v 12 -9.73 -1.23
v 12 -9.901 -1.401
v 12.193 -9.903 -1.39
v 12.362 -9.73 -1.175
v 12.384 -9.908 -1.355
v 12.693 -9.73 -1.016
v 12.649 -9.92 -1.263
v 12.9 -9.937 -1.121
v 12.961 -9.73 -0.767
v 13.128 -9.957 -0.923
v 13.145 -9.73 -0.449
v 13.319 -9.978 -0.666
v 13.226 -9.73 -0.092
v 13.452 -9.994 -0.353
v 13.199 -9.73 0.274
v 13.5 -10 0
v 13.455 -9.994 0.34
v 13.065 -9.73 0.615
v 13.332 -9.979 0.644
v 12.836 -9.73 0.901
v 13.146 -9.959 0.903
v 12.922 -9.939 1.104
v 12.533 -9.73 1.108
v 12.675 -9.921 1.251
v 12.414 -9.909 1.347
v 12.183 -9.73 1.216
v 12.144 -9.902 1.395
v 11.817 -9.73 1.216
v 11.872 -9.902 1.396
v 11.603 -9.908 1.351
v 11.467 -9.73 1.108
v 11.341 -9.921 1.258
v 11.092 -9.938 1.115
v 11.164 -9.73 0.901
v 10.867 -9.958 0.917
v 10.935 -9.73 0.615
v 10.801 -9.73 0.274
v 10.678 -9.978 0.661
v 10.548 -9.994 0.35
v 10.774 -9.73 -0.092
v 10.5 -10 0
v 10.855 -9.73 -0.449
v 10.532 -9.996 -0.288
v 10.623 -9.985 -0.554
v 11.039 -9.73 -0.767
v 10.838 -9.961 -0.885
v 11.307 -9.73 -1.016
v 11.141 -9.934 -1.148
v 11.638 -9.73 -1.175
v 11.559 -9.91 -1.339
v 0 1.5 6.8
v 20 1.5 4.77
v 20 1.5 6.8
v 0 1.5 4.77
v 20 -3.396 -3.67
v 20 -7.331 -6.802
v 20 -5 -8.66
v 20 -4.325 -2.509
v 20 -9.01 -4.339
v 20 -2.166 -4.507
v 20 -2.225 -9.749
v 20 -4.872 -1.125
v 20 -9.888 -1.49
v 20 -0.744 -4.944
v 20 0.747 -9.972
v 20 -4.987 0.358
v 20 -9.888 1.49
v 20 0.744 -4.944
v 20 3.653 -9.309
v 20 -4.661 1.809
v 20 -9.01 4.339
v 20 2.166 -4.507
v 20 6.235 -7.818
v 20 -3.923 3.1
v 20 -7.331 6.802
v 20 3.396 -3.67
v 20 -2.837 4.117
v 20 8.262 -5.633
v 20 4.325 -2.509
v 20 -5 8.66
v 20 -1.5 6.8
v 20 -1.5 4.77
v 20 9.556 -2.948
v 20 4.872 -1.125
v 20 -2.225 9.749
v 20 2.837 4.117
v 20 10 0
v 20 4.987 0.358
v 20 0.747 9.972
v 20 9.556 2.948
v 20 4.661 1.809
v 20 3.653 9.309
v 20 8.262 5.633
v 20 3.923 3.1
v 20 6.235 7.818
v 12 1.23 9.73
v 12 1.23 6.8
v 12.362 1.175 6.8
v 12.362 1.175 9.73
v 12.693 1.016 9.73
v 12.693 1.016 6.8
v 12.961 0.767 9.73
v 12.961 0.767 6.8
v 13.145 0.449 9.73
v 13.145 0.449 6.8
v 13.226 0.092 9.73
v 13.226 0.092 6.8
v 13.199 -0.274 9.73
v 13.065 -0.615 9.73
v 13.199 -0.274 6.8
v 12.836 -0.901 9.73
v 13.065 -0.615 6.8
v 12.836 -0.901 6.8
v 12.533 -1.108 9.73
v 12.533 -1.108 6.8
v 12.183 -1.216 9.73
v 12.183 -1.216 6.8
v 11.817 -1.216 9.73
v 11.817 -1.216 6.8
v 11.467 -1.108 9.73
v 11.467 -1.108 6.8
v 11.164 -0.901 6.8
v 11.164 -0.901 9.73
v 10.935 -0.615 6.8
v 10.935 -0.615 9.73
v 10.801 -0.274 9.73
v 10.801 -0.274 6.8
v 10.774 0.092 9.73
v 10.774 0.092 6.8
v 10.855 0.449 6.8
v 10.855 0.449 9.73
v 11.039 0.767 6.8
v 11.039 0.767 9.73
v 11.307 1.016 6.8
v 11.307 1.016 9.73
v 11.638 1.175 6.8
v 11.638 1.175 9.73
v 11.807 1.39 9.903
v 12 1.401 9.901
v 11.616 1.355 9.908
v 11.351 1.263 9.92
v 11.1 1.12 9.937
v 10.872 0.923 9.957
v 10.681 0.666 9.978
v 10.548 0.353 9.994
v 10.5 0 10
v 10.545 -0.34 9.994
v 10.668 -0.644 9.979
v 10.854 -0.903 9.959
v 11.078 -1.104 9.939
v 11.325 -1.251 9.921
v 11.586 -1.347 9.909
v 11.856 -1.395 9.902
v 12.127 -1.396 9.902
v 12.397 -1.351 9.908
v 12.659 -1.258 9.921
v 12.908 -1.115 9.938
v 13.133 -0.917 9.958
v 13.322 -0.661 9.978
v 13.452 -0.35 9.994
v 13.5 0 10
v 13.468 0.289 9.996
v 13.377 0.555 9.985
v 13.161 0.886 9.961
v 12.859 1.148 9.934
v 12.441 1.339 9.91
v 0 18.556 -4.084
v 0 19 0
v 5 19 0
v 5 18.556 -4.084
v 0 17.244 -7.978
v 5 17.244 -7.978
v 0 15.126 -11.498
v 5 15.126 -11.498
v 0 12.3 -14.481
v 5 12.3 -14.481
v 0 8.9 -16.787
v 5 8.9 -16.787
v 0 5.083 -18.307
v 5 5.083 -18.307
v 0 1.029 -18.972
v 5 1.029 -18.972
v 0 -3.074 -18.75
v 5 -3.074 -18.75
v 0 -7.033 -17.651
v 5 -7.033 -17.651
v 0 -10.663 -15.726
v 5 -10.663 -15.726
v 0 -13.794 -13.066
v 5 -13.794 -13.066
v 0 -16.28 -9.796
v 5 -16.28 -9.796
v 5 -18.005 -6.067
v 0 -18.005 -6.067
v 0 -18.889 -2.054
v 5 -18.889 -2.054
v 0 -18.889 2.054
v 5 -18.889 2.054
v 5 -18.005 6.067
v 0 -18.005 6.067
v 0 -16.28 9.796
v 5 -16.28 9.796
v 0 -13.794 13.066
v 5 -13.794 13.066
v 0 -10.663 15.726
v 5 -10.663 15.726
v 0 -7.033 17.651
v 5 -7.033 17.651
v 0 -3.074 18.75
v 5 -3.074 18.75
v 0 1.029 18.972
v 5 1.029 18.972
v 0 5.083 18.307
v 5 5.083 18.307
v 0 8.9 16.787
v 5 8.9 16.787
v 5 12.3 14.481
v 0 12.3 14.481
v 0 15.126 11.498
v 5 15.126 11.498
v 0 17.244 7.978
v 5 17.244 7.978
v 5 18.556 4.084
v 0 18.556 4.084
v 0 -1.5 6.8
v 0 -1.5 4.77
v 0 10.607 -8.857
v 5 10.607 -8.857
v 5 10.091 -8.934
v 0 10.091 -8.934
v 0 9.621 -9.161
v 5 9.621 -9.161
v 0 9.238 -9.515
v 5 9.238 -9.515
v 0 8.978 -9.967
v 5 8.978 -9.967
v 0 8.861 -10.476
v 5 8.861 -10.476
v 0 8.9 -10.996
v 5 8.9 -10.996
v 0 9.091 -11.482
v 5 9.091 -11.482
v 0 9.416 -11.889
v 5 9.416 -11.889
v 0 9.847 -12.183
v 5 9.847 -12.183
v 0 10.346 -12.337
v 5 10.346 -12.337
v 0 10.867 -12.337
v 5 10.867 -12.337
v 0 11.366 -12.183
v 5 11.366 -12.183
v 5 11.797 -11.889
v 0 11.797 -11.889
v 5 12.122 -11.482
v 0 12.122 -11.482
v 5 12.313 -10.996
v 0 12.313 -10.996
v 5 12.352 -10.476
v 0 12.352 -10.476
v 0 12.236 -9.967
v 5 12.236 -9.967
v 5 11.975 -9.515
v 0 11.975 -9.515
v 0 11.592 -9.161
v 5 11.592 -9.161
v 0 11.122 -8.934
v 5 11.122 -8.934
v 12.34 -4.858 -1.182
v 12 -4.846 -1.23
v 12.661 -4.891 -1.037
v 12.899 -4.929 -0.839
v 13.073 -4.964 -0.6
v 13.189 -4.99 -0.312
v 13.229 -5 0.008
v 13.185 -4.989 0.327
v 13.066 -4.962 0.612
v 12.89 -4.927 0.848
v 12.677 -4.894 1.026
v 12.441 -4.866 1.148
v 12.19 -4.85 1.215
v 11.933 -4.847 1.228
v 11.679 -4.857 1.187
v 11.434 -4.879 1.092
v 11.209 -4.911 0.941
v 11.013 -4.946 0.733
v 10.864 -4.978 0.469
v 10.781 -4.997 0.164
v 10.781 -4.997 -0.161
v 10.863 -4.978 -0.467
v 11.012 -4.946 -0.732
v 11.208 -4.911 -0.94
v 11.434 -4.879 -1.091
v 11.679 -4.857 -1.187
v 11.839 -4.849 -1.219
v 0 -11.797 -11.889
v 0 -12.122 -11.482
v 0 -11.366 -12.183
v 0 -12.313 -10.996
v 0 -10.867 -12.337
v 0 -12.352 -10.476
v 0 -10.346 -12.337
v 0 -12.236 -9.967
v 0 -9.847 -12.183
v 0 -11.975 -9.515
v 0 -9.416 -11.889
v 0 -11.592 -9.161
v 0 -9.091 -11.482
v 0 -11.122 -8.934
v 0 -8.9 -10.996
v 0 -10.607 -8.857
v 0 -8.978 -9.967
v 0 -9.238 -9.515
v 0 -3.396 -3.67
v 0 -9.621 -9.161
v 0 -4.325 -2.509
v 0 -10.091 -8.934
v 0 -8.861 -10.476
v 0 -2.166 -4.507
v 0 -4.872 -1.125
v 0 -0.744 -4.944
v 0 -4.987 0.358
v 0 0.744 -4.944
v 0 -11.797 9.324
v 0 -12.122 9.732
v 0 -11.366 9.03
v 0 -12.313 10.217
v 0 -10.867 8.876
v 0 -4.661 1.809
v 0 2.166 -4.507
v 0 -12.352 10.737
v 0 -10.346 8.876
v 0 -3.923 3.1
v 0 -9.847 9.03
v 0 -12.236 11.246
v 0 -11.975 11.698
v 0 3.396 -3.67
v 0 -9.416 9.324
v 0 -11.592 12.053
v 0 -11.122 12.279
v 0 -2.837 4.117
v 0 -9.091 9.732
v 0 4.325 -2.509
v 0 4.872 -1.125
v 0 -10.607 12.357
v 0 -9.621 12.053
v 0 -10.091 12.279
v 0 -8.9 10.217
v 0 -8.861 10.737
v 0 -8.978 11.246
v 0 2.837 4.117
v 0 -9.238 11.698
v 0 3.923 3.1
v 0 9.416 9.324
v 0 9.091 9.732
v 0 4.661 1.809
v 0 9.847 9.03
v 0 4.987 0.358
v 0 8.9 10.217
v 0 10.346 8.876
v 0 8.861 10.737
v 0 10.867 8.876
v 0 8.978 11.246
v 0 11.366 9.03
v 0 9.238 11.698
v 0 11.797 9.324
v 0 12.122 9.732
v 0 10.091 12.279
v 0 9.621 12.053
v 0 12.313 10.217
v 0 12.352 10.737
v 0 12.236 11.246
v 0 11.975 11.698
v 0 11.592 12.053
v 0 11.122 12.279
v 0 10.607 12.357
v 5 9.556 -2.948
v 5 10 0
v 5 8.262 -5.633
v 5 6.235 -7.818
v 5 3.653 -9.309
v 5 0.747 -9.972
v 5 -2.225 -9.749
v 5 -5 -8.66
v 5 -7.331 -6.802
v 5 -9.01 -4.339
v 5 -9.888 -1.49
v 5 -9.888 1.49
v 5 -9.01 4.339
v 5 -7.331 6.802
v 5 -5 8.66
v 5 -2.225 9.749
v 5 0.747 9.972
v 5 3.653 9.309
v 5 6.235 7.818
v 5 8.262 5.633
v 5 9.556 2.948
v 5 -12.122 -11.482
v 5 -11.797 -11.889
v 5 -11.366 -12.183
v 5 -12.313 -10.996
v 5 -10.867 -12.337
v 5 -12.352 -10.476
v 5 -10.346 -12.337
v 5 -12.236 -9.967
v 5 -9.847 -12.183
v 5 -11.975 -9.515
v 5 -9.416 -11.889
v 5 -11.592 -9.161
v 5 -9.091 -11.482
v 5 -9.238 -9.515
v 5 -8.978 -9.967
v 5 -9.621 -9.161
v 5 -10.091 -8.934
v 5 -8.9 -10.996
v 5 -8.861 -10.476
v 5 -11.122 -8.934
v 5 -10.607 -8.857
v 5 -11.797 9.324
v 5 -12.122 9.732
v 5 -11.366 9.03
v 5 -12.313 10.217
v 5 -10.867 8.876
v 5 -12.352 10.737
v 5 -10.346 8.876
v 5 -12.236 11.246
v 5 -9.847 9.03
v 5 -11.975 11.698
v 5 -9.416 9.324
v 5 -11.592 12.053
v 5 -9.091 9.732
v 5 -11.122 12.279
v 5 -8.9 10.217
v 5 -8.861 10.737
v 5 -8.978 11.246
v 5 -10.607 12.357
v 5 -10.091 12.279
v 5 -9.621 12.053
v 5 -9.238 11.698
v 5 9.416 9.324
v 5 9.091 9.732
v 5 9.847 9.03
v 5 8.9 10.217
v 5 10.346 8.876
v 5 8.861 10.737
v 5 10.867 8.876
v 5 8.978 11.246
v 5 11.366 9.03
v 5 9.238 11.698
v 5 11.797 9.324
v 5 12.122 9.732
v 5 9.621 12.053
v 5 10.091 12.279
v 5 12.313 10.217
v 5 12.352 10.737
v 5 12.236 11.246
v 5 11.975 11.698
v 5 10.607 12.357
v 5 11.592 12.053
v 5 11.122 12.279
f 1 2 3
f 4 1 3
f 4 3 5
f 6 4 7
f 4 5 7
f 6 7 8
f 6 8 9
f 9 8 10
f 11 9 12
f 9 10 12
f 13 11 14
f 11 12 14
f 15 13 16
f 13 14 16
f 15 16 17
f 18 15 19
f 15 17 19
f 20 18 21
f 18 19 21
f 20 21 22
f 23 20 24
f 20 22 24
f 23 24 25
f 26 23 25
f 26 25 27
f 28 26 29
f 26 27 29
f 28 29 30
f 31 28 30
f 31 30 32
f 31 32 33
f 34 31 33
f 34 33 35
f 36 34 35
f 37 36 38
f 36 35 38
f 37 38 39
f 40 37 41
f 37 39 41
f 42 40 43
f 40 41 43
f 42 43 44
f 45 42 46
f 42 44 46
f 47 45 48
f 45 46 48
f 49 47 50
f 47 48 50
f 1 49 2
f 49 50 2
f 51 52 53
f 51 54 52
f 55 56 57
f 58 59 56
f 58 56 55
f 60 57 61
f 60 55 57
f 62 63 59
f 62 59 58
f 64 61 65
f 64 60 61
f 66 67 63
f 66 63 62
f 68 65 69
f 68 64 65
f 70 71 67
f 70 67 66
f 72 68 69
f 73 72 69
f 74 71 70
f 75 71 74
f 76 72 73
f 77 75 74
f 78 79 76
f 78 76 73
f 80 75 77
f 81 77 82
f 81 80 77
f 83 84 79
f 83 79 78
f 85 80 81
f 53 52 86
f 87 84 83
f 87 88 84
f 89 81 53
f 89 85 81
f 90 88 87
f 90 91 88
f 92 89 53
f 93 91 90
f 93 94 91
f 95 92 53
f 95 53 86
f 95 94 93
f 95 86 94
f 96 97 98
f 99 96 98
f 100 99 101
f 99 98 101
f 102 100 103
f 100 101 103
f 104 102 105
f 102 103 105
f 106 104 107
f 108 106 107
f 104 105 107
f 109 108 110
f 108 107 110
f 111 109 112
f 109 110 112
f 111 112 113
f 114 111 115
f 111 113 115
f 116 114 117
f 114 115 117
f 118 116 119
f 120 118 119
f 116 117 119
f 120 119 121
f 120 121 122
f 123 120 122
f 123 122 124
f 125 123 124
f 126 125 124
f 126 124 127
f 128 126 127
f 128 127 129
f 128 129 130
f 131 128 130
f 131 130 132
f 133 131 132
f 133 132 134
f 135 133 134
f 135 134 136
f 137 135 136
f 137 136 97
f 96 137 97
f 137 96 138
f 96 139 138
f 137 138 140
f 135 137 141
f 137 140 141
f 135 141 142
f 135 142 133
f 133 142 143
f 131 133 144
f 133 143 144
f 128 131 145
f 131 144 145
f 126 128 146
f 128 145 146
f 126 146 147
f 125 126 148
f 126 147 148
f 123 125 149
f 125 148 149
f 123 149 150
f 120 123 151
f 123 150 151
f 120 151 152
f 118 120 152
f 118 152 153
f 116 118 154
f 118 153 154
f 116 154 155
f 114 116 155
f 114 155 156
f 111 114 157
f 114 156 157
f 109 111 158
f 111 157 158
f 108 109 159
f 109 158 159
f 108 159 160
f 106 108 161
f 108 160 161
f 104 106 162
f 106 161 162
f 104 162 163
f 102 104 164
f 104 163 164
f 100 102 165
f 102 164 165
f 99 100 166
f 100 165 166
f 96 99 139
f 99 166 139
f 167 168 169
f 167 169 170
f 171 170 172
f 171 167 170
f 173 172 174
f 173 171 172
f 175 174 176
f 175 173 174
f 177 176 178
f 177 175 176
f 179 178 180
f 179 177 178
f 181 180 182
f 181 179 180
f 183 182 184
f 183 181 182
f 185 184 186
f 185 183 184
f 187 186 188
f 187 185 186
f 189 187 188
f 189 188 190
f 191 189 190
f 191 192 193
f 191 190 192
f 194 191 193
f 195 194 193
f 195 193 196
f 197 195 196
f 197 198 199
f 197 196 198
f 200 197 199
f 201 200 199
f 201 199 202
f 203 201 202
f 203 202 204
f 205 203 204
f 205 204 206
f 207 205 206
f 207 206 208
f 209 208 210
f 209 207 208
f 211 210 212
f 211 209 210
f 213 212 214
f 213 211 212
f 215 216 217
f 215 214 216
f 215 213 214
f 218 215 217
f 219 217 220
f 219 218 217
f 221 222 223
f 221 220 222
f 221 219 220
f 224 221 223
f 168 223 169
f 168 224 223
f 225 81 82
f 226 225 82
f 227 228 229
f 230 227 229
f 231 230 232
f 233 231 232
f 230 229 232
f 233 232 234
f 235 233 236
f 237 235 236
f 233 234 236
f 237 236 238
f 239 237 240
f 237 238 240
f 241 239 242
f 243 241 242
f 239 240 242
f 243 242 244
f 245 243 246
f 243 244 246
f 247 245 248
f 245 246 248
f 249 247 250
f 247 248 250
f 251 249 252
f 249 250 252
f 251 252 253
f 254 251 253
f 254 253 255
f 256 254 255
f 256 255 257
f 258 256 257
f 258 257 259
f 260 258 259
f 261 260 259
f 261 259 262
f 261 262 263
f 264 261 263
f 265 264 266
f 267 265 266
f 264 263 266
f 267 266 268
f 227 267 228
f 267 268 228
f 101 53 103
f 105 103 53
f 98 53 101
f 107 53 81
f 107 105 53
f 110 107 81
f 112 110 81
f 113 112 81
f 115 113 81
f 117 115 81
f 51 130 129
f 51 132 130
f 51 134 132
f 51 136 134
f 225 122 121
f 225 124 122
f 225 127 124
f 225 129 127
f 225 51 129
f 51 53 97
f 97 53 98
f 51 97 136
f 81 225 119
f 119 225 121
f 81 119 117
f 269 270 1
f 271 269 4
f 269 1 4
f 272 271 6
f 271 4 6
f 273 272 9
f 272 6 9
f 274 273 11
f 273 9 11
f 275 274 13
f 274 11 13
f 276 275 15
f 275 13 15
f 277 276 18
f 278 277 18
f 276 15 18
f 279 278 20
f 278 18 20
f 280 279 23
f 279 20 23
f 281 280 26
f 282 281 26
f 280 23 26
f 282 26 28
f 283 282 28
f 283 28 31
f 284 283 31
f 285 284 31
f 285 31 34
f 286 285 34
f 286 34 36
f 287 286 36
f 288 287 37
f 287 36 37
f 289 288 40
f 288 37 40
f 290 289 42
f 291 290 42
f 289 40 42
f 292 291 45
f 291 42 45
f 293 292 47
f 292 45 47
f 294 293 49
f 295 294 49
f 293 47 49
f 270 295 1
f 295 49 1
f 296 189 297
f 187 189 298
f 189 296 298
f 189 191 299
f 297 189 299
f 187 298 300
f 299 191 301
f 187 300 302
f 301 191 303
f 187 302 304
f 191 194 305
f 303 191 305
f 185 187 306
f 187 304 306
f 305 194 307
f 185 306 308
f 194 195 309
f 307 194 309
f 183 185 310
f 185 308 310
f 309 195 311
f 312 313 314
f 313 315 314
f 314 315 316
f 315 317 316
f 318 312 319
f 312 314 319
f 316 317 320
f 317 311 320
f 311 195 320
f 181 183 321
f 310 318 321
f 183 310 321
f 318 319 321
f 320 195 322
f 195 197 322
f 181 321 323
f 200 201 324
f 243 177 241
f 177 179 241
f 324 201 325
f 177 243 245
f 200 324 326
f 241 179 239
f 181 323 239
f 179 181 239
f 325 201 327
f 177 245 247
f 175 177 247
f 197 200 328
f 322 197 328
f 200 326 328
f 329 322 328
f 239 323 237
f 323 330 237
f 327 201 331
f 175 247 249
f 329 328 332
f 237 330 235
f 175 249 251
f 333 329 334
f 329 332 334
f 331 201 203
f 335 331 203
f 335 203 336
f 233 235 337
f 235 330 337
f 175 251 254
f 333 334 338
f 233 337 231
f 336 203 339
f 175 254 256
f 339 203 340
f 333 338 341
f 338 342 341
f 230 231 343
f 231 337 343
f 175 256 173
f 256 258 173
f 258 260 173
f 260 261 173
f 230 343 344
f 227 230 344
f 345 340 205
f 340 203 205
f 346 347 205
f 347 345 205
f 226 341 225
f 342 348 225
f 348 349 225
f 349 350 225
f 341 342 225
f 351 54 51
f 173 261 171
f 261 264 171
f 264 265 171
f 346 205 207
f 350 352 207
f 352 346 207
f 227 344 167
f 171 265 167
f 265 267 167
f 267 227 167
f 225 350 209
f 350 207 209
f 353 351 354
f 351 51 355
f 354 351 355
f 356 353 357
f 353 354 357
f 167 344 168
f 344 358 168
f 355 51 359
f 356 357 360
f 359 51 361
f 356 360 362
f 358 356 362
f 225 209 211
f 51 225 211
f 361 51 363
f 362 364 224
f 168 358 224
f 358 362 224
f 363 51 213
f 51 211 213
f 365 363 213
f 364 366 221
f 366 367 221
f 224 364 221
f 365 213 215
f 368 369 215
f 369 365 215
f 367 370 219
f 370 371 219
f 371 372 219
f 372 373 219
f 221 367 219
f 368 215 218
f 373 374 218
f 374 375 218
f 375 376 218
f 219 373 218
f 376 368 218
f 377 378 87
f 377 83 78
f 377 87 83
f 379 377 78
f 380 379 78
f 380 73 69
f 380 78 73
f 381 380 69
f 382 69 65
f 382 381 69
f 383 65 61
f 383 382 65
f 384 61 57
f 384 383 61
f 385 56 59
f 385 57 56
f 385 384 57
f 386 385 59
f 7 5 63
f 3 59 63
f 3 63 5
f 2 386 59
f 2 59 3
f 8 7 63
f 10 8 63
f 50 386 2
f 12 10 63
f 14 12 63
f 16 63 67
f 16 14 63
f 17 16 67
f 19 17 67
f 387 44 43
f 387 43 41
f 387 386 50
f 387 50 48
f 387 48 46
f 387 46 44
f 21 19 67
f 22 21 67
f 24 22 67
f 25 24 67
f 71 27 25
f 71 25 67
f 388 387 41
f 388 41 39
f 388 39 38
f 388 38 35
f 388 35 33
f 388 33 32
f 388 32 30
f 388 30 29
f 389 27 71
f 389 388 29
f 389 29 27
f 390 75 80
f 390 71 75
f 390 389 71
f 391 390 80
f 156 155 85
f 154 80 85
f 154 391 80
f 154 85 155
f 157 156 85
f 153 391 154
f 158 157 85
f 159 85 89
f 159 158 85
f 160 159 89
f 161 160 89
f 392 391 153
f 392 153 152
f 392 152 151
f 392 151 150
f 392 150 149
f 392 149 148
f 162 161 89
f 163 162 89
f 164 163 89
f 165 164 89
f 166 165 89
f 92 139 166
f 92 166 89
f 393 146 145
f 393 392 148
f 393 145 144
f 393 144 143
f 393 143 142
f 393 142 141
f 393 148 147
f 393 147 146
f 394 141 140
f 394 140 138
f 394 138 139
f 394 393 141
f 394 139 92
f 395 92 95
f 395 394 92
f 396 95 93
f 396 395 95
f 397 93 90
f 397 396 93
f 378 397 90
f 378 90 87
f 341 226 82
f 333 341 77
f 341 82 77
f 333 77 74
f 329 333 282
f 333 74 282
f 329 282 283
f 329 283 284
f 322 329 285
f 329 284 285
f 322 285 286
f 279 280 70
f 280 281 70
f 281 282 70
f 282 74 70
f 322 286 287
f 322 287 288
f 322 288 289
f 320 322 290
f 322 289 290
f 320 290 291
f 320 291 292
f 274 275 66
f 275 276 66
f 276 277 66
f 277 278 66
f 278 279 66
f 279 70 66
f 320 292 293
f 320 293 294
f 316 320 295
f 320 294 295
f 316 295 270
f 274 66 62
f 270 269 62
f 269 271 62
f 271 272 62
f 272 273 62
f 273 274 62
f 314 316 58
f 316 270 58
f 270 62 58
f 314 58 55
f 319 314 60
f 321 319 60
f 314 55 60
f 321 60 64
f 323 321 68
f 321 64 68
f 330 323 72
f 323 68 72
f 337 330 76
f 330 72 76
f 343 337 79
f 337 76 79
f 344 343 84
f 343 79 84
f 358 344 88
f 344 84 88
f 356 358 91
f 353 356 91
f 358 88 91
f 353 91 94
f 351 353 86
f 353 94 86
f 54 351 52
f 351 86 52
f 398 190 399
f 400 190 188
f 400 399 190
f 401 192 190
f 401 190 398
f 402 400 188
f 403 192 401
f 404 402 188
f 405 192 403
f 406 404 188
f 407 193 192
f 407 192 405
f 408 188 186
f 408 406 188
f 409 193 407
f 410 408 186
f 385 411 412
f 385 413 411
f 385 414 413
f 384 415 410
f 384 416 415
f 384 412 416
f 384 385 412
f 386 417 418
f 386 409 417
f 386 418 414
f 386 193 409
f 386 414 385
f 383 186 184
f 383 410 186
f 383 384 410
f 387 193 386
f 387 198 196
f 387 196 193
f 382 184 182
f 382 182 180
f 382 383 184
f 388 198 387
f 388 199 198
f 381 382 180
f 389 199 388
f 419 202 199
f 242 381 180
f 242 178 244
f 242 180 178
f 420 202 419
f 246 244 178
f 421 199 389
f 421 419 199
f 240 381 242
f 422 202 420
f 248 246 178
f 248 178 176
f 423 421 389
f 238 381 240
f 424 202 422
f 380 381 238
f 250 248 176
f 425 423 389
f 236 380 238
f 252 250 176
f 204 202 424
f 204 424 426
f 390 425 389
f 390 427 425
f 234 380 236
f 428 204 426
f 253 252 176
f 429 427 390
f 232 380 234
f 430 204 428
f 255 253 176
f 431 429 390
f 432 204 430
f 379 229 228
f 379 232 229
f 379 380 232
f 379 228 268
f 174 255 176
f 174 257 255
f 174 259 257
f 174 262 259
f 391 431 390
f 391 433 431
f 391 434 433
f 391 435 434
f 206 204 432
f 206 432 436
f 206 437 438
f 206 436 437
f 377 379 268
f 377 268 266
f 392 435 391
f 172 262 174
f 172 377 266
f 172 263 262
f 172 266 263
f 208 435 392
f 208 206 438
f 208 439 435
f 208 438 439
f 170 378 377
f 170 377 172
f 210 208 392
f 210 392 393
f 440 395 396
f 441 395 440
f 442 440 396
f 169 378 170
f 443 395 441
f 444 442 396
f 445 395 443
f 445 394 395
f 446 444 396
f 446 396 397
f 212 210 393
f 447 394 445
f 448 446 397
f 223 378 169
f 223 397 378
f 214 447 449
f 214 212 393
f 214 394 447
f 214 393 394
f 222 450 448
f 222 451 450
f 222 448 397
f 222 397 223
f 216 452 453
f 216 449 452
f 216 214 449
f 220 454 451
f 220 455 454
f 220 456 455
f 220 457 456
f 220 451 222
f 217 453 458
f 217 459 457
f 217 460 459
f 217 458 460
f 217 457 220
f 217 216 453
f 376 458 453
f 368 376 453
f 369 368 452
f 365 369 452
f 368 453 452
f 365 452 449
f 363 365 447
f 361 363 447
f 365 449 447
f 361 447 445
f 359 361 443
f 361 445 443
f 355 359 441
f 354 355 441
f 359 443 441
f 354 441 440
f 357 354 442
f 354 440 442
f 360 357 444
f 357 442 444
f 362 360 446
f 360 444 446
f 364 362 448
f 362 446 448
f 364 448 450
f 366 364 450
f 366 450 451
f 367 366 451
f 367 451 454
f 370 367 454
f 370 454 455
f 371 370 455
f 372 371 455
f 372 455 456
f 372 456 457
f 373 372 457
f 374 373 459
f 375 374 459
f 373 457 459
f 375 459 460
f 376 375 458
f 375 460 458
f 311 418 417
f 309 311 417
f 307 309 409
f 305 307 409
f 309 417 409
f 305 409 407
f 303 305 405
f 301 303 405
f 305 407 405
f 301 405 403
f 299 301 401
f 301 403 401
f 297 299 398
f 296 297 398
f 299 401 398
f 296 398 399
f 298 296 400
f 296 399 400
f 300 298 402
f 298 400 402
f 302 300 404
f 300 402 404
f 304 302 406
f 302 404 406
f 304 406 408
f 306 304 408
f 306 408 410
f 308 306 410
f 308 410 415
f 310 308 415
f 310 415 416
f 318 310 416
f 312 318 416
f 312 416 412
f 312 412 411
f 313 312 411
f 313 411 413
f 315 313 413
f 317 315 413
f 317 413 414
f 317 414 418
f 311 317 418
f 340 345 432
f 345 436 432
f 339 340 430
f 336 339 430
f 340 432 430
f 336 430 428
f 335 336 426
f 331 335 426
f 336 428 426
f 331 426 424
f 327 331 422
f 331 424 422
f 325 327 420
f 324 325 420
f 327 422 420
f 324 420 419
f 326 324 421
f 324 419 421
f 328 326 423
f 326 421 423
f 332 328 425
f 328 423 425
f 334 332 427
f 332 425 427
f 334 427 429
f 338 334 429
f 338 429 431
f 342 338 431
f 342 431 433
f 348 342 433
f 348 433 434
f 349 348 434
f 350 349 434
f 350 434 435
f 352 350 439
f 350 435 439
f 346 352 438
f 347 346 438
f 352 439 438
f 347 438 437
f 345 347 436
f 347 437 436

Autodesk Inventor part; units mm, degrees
sketch "Sketch_1" plane through (0, 0, 0) normal (0, 0, 1) x (1, 0, 0)
  line L0 (20, 0) -> (0, 0)
  line L1 (0, 5) -> (20, 5)
  line L2 (20, 5) -> (20, 10)
  line L3 (20, 10) -> (5, 10)
  line L4 (5, 10) -> (5, 19)
  line L5 (5, 19) -> (0, 19)
  line L6 (0, 19) -> (0, 5)
revolve "Revolution1" add sketch "Sketch_1" angle 360 about axis through (20, 0, 0) along (1, 0, 0)
sketch "Sketch2" plane through (0, 0, 0) normal (-1, 0, 0) x (0, 0, 1)
  point P0 (-10.6066, 10.6066)
hole "Hole1" at (0, 10.6066, -10.6066) direction (1, 0, 0) diameter 3.5 depth 5
pattern_linear "Rectangular Pattern1" count 2 spacing 21.2132 along (0, 0, 1) count 2 spacing 21.2132 along (0, -1, 0) of "Hole1"
sketch "Sketch_4" plane through (12, 0, 0) normal (1, 0, 0) x (0, 0, -1)
  line L0 (0, -10) -> (0, -4)
  line L1 (0, -4) -> (1.2295, -4)
  line L2 (1.2295, -4) -> (1.2295, -9.7295)
  line L3 (1.2295, -9.7295) -> (1.5, -10)
  line L4 (1.5, -10) -> (0, -10)
  line L5 (0, -10) -> (0, -4)
revolve "Revolution2" cut sketch "Sketch_4" angle 360 about axis through (12, -10, 0) along (0, -1, 0)
thread "Thread1" size "M3x0.5" class "6H" standard "ISO Metric profile" full length
sketch "Sketch_8" plane through (0, 0, 0) normal (1, 0, 0) x (0, 1, 0)
  line L0 (1.5, 6.8) -> (-1.5, 6.8)
  line L1 (-1.5, 6.8) -> (-1.5, 0)
  line L2 (-1.5, 0) -> (1.5, 0)
  line L3 (1.5, 0) -> (1.5, 6.8)
extrude "Extrusion1" cut sketch "Sketch_8" along normal blind 20
sketch "Sketch_5" plane through (12, 0, 0) normal (1, 0, 0) x (0, 0, -1)
  line L0 (-5, 0) -> (-10, 0)
  line L1 (-10, 0) -> (-10, 1.5)
  line L2 (-10, 1.5) -> (-9.7295, 1.2295)
  line L3 (-9.7295, 1.2295) -> (-5, 1.2295)
  line L4 (-5, 1.2295) -> (-5, 0)
  line L5 (-5, 0) -> (-10, 0)
revolve "Revolution3" cut sketch "Sketch_5" angle 360 about axis through (12, 0, 5) along (0, 0, -1)
thread "Thread2" size "M3x0.5" class "6H" standard "ISO Metric profile" length 2.9295
ref_plane "to_screw1_XY" through (12, 0, 6.8) normal (0, 0, 1) x (1, 0, 0)
ref_plane "to_screw1_YZ" through (12, 0, 6.8) normal (1, 0, 0) x (0, 1, 0)
ref_plane "to_screw1_ZX" through (12, 0, 6.8) normal (0, 1, 0) x (0, 0, 1)
ref_plane "to_screw2_XY" through (12, -5, 0) normal (0, -1, 0) x (1, 0, 0)
ref_plane "to_screw2_YZ" through (12, -5, 0) normal (1, 0, 0) x (0, 0, 1)
ref_plane "to_screw2_ZX" through (12, -5, 0) normal (0, 0, 1) x (0, -1, 0)
properties part number "STHRANG10-MB_ss"
